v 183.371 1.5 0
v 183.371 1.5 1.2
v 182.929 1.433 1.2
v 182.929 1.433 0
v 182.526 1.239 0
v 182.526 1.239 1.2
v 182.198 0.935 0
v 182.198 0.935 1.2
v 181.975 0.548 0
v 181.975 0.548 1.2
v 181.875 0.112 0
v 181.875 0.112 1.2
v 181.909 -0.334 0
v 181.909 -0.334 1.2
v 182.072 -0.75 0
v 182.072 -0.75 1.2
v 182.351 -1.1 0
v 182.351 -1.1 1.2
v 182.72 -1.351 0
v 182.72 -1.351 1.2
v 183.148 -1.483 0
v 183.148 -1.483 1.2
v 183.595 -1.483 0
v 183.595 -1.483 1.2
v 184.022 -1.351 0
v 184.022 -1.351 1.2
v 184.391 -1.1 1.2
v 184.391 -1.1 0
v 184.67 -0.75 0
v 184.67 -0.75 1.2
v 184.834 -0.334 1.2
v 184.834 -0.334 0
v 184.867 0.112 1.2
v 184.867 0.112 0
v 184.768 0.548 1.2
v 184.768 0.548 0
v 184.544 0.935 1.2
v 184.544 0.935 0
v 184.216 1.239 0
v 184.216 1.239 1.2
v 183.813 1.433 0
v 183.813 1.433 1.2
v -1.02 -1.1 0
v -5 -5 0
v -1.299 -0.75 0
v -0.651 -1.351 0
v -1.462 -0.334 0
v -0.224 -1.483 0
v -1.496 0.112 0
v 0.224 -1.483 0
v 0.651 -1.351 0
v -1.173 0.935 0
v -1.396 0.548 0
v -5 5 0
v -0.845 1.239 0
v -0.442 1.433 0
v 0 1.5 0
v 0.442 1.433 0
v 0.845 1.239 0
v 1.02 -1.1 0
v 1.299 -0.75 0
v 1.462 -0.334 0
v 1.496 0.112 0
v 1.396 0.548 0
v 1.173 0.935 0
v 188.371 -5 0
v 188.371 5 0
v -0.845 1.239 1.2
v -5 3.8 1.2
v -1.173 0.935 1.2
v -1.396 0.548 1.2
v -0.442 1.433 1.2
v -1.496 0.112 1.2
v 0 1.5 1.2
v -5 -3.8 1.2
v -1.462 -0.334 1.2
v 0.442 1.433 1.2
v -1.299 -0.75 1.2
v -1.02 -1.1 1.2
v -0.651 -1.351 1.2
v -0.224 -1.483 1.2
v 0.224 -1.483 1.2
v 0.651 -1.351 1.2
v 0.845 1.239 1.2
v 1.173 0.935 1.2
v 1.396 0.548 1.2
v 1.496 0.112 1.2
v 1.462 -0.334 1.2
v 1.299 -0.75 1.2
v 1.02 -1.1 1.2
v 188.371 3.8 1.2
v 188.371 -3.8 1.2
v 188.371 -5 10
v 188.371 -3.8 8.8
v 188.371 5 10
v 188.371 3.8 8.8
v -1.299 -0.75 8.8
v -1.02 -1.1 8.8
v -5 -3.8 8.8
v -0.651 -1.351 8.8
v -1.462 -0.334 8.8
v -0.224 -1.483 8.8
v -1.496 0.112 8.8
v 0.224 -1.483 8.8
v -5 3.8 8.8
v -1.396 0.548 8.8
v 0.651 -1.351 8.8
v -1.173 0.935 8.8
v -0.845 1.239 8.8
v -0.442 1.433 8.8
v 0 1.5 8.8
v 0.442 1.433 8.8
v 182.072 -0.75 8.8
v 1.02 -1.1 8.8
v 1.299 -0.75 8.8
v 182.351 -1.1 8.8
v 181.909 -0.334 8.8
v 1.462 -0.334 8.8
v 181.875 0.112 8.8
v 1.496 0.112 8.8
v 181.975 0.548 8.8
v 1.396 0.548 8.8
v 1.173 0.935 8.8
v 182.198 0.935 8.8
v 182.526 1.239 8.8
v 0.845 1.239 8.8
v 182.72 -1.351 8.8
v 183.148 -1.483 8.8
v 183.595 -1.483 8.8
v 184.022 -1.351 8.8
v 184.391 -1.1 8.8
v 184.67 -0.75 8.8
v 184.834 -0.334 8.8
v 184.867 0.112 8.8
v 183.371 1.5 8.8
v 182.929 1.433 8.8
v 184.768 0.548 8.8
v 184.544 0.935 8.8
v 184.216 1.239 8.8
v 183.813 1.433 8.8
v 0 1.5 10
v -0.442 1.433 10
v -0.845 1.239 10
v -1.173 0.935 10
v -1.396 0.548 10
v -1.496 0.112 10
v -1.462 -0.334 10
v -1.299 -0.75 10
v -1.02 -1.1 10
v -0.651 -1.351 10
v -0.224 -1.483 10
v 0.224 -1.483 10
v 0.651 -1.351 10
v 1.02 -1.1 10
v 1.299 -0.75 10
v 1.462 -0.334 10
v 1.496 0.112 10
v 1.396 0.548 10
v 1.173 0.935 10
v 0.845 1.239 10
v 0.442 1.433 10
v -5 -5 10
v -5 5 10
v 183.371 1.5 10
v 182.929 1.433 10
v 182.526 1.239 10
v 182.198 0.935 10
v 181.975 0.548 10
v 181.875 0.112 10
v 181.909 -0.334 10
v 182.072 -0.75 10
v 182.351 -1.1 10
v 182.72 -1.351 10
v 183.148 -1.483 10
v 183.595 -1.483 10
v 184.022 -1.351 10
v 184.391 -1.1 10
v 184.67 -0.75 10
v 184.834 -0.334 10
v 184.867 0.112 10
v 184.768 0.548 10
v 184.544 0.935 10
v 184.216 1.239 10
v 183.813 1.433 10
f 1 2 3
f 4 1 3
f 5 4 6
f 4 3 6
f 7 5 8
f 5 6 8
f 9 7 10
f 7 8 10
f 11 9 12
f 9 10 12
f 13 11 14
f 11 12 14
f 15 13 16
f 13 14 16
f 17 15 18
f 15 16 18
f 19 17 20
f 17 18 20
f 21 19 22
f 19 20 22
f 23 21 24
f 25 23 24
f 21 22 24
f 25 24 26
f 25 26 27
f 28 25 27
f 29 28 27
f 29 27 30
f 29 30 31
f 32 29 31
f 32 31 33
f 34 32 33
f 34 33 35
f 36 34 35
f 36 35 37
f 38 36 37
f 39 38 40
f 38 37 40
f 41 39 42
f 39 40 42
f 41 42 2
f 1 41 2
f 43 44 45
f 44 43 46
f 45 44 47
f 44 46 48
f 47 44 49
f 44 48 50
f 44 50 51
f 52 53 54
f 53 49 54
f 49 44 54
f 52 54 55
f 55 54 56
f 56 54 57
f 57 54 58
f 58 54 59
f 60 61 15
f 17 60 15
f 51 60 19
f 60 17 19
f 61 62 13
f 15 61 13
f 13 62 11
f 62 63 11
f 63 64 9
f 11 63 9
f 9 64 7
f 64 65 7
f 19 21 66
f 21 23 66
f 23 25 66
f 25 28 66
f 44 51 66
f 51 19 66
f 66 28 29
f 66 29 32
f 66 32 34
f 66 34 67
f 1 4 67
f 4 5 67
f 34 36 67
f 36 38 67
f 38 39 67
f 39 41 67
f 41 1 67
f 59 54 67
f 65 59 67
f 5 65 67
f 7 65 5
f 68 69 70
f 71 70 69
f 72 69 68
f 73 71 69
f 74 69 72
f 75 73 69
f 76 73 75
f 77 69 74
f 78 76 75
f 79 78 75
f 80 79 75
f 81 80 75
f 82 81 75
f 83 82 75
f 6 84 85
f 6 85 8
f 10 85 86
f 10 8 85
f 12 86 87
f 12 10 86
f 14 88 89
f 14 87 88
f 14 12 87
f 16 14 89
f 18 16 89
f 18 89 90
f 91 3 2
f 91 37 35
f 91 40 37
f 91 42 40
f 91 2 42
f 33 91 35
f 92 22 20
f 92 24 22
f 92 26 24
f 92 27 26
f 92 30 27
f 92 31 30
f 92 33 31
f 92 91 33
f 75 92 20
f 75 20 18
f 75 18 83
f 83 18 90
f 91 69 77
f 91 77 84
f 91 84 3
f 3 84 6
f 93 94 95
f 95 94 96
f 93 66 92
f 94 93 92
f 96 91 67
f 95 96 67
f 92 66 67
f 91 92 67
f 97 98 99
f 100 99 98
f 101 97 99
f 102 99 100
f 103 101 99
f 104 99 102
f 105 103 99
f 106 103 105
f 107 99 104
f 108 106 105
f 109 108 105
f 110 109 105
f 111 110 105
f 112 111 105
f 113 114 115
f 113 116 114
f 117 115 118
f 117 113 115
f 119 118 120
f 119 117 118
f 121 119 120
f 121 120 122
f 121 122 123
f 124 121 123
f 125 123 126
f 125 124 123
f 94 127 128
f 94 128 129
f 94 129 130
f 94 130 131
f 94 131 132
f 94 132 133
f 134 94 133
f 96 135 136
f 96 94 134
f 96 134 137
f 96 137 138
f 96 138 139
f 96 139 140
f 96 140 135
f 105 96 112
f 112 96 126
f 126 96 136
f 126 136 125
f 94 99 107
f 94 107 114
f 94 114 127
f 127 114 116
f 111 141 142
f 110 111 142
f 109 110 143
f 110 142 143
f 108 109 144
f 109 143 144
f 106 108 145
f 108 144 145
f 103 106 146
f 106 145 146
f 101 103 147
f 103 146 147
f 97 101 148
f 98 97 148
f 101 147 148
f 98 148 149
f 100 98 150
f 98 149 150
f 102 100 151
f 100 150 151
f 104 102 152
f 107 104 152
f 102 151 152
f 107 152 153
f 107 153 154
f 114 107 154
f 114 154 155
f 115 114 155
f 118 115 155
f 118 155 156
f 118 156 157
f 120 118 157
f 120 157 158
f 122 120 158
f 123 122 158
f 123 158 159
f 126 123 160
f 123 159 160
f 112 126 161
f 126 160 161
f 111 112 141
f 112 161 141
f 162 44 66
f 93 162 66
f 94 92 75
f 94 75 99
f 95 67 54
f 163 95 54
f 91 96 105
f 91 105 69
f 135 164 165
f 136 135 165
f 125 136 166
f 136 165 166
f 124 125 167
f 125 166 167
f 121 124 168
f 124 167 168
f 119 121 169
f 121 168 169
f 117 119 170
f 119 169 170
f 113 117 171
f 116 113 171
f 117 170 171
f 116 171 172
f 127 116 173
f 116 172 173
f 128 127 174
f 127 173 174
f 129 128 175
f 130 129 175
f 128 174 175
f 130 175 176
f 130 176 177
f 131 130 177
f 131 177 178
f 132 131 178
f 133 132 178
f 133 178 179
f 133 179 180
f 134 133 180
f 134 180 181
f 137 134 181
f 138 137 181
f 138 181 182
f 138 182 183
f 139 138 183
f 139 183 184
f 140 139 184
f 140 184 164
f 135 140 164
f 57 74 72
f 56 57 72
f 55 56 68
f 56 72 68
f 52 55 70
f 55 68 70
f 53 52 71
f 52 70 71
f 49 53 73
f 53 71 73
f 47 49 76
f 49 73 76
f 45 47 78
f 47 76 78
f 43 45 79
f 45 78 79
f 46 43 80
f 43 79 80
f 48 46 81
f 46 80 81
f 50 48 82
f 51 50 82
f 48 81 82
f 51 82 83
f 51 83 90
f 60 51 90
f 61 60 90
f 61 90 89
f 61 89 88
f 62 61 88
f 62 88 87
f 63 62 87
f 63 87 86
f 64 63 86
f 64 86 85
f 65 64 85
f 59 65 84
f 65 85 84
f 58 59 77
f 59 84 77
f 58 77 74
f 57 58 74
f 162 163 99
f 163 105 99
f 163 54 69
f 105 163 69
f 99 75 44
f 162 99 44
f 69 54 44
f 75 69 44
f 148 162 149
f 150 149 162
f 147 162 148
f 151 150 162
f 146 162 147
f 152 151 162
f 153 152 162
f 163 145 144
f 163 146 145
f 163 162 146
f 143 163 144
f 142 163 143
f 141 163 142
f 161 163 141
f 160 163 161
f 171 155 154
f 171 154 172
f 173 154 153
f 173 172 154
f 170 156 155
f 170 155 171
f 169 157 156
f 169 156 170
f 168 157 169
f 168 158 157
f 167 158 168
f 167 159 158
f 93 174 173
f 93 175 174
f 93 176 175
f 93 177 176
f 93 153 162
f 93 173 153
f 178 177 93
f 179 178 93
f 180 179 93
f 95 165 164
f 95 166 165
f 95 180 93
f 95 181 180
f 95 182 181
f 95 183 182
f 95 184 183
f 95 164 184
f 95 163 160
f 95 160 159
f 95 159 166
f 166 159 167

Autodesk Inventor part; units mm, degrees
ref_plane "YZ Plane" through (0, 0, 0) normal (1, 0, 0) x (0, 1, 0)
ref_plane "XZ Plane" through (0, 0, 0) normal (0, 1, 0) x (-1, 0, 0)
ref_plane "XY Plane" through (0, 0, 0) normal (0, 0, 1) x (1, 0, 0)
sketch "スケッチ2" plane through (0, 0, 0) normal (0, 0, 1) x (1, 0, 0)
  line L0 (0, 0) -> (148.4693, 71.9851)
  line L1 (148.4693, 71.9851) -> (183.3712, 0)
  line L2 (0, 0) -> (183.3712, 0)
  line L3 (-5, -5) -> (188.3712, -5)
  line L4 (188.3712, -5) -> (188.3712, 5)
  line L5 (188.3712, 5) -> (-5, 5)
  line L6 (-5, 5) -> (-5, -5)
  dimension "d3" = 165
  dimension "d4" = 80
  dimension "d5" = 10
  dimension "d6" = 5
  dimension "d7" = 5
extrude "押し出し1" add sketch "スケッチ2" along normal blind 10 contours L2 L1 L5 L4 L3 L6 L0 | L0 L5 L1 L2
sketch "スケッチ3" plane through (188.3712, -5, 0) normal (1, 0, 0) x (0, 0, -1)
  line L0 (0, 0) -> (0, 10) projected
  line L1 (0, 10) -> (-10, 10) projected
  line L2 (-10, 0) -> (-10, 10) projected
  line L3 (0, 0) -> (-10, 0) projected
  line L4 (-8.8, 8.8) -> (-1.2, 8.8)
  line L5 (-1.2, 8.8) -> (-1.2, 1.2)
  line L6 (-1.2, 1.2) -> (-8.8, 1.2)
  line L7 (-8.8, 1.2) -> (-8.8, 8.8)
  point P0 (0, 5)
  dimension "d10" = 1.2
extrude "押し出し2" cut sketch "スケッチ3" against normal through all contours L4 L5 L6 L7
hole "穴1" at (0, 0, 0) at (183.3712, 0, 0) direction (0, 0, 1) diameter 3 end through all
properties part number "truss_1010_zegi" material "アルミニウム 6061-AHC"
